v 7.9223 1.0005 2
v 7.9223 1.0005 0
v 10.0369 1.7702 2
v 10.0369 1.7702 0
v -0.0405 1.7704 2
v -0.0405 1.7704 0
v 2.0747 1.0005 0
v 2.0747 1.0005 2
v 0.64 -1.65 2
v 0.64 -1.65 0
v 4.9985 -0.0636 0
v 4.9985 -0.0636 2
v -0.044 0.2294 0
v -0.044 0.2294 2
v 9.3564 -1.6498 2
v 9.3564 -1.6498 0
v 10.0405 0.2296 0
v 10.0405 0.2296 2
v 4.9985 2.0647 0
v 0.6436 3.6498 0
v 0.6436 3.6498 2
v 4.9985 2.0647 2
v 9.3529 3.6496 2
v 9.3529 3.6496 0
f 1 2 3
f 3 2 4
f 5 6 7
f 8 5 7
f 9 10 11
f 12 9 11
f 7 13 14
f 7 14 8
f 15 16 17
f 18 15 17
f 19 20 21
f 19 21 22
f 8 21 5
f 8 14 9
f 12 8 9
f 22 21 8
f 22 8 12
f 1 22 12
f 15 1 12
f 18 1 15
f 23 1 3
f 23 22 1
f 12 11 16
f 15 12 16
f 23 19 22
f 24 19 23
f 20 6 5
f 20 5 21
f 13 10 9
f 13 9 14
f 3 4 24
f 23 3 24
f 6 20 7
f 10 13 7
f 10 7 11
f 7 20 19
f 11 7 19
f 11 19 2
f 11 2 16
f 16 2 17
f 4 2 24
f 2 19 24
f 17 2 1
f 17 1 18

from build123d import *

# Parameters (mm, degrees)
BOX001_W               = 10
BOX001_H               = 2
BOX001_DEPTH           = 2
BOX001_PLACEMENT_ANGLE = 340
BOX_W                  = 10
BOX_H                  = 2
BOX_DEPTH              = 2
BOX_PLACEMENT_ANGLE    = 20


with BuildPart() as cube001:
    # Box001 → Box001 (new body)
    with BuildSketch(Plane.XY):
        with Locations((5, 1)):
            Rectangle(BOX001_W, BOX001_H)
    extrude(amount=BOX001_DEPTH)


with BuildPart() as cube001_1:
    # Box001 placement: moved
    add(cube001.part.moved(Location((-0.040483, 1.770408, 0))).rotate(Axis((-0.040483, 1.770408, 0), (0, 0, 1)), BOX001_PLACEMENT_ANGLE))


with BuildPart() as fusion:
    # Box → Box (new body)
    with BuildSketch(Plane.XY):
        with Locations((5, 1)):
            Rectangle(BOX_W, BOX_H)
    extrude(amount=BOX_DEPTH)


with BuildPart() as fusion_1:
    # Box placement: moved
    add(fusion.part.moved(Location((0.64, -1.65, 0))).rotate(Axis((0.64, -1.65, 0), (0, 0, 1)), BOX_PLACEMENT_ANGLE))

    # Fusion: union Cube001
    add(cube001_1.part)


solid = fusion_1.part
